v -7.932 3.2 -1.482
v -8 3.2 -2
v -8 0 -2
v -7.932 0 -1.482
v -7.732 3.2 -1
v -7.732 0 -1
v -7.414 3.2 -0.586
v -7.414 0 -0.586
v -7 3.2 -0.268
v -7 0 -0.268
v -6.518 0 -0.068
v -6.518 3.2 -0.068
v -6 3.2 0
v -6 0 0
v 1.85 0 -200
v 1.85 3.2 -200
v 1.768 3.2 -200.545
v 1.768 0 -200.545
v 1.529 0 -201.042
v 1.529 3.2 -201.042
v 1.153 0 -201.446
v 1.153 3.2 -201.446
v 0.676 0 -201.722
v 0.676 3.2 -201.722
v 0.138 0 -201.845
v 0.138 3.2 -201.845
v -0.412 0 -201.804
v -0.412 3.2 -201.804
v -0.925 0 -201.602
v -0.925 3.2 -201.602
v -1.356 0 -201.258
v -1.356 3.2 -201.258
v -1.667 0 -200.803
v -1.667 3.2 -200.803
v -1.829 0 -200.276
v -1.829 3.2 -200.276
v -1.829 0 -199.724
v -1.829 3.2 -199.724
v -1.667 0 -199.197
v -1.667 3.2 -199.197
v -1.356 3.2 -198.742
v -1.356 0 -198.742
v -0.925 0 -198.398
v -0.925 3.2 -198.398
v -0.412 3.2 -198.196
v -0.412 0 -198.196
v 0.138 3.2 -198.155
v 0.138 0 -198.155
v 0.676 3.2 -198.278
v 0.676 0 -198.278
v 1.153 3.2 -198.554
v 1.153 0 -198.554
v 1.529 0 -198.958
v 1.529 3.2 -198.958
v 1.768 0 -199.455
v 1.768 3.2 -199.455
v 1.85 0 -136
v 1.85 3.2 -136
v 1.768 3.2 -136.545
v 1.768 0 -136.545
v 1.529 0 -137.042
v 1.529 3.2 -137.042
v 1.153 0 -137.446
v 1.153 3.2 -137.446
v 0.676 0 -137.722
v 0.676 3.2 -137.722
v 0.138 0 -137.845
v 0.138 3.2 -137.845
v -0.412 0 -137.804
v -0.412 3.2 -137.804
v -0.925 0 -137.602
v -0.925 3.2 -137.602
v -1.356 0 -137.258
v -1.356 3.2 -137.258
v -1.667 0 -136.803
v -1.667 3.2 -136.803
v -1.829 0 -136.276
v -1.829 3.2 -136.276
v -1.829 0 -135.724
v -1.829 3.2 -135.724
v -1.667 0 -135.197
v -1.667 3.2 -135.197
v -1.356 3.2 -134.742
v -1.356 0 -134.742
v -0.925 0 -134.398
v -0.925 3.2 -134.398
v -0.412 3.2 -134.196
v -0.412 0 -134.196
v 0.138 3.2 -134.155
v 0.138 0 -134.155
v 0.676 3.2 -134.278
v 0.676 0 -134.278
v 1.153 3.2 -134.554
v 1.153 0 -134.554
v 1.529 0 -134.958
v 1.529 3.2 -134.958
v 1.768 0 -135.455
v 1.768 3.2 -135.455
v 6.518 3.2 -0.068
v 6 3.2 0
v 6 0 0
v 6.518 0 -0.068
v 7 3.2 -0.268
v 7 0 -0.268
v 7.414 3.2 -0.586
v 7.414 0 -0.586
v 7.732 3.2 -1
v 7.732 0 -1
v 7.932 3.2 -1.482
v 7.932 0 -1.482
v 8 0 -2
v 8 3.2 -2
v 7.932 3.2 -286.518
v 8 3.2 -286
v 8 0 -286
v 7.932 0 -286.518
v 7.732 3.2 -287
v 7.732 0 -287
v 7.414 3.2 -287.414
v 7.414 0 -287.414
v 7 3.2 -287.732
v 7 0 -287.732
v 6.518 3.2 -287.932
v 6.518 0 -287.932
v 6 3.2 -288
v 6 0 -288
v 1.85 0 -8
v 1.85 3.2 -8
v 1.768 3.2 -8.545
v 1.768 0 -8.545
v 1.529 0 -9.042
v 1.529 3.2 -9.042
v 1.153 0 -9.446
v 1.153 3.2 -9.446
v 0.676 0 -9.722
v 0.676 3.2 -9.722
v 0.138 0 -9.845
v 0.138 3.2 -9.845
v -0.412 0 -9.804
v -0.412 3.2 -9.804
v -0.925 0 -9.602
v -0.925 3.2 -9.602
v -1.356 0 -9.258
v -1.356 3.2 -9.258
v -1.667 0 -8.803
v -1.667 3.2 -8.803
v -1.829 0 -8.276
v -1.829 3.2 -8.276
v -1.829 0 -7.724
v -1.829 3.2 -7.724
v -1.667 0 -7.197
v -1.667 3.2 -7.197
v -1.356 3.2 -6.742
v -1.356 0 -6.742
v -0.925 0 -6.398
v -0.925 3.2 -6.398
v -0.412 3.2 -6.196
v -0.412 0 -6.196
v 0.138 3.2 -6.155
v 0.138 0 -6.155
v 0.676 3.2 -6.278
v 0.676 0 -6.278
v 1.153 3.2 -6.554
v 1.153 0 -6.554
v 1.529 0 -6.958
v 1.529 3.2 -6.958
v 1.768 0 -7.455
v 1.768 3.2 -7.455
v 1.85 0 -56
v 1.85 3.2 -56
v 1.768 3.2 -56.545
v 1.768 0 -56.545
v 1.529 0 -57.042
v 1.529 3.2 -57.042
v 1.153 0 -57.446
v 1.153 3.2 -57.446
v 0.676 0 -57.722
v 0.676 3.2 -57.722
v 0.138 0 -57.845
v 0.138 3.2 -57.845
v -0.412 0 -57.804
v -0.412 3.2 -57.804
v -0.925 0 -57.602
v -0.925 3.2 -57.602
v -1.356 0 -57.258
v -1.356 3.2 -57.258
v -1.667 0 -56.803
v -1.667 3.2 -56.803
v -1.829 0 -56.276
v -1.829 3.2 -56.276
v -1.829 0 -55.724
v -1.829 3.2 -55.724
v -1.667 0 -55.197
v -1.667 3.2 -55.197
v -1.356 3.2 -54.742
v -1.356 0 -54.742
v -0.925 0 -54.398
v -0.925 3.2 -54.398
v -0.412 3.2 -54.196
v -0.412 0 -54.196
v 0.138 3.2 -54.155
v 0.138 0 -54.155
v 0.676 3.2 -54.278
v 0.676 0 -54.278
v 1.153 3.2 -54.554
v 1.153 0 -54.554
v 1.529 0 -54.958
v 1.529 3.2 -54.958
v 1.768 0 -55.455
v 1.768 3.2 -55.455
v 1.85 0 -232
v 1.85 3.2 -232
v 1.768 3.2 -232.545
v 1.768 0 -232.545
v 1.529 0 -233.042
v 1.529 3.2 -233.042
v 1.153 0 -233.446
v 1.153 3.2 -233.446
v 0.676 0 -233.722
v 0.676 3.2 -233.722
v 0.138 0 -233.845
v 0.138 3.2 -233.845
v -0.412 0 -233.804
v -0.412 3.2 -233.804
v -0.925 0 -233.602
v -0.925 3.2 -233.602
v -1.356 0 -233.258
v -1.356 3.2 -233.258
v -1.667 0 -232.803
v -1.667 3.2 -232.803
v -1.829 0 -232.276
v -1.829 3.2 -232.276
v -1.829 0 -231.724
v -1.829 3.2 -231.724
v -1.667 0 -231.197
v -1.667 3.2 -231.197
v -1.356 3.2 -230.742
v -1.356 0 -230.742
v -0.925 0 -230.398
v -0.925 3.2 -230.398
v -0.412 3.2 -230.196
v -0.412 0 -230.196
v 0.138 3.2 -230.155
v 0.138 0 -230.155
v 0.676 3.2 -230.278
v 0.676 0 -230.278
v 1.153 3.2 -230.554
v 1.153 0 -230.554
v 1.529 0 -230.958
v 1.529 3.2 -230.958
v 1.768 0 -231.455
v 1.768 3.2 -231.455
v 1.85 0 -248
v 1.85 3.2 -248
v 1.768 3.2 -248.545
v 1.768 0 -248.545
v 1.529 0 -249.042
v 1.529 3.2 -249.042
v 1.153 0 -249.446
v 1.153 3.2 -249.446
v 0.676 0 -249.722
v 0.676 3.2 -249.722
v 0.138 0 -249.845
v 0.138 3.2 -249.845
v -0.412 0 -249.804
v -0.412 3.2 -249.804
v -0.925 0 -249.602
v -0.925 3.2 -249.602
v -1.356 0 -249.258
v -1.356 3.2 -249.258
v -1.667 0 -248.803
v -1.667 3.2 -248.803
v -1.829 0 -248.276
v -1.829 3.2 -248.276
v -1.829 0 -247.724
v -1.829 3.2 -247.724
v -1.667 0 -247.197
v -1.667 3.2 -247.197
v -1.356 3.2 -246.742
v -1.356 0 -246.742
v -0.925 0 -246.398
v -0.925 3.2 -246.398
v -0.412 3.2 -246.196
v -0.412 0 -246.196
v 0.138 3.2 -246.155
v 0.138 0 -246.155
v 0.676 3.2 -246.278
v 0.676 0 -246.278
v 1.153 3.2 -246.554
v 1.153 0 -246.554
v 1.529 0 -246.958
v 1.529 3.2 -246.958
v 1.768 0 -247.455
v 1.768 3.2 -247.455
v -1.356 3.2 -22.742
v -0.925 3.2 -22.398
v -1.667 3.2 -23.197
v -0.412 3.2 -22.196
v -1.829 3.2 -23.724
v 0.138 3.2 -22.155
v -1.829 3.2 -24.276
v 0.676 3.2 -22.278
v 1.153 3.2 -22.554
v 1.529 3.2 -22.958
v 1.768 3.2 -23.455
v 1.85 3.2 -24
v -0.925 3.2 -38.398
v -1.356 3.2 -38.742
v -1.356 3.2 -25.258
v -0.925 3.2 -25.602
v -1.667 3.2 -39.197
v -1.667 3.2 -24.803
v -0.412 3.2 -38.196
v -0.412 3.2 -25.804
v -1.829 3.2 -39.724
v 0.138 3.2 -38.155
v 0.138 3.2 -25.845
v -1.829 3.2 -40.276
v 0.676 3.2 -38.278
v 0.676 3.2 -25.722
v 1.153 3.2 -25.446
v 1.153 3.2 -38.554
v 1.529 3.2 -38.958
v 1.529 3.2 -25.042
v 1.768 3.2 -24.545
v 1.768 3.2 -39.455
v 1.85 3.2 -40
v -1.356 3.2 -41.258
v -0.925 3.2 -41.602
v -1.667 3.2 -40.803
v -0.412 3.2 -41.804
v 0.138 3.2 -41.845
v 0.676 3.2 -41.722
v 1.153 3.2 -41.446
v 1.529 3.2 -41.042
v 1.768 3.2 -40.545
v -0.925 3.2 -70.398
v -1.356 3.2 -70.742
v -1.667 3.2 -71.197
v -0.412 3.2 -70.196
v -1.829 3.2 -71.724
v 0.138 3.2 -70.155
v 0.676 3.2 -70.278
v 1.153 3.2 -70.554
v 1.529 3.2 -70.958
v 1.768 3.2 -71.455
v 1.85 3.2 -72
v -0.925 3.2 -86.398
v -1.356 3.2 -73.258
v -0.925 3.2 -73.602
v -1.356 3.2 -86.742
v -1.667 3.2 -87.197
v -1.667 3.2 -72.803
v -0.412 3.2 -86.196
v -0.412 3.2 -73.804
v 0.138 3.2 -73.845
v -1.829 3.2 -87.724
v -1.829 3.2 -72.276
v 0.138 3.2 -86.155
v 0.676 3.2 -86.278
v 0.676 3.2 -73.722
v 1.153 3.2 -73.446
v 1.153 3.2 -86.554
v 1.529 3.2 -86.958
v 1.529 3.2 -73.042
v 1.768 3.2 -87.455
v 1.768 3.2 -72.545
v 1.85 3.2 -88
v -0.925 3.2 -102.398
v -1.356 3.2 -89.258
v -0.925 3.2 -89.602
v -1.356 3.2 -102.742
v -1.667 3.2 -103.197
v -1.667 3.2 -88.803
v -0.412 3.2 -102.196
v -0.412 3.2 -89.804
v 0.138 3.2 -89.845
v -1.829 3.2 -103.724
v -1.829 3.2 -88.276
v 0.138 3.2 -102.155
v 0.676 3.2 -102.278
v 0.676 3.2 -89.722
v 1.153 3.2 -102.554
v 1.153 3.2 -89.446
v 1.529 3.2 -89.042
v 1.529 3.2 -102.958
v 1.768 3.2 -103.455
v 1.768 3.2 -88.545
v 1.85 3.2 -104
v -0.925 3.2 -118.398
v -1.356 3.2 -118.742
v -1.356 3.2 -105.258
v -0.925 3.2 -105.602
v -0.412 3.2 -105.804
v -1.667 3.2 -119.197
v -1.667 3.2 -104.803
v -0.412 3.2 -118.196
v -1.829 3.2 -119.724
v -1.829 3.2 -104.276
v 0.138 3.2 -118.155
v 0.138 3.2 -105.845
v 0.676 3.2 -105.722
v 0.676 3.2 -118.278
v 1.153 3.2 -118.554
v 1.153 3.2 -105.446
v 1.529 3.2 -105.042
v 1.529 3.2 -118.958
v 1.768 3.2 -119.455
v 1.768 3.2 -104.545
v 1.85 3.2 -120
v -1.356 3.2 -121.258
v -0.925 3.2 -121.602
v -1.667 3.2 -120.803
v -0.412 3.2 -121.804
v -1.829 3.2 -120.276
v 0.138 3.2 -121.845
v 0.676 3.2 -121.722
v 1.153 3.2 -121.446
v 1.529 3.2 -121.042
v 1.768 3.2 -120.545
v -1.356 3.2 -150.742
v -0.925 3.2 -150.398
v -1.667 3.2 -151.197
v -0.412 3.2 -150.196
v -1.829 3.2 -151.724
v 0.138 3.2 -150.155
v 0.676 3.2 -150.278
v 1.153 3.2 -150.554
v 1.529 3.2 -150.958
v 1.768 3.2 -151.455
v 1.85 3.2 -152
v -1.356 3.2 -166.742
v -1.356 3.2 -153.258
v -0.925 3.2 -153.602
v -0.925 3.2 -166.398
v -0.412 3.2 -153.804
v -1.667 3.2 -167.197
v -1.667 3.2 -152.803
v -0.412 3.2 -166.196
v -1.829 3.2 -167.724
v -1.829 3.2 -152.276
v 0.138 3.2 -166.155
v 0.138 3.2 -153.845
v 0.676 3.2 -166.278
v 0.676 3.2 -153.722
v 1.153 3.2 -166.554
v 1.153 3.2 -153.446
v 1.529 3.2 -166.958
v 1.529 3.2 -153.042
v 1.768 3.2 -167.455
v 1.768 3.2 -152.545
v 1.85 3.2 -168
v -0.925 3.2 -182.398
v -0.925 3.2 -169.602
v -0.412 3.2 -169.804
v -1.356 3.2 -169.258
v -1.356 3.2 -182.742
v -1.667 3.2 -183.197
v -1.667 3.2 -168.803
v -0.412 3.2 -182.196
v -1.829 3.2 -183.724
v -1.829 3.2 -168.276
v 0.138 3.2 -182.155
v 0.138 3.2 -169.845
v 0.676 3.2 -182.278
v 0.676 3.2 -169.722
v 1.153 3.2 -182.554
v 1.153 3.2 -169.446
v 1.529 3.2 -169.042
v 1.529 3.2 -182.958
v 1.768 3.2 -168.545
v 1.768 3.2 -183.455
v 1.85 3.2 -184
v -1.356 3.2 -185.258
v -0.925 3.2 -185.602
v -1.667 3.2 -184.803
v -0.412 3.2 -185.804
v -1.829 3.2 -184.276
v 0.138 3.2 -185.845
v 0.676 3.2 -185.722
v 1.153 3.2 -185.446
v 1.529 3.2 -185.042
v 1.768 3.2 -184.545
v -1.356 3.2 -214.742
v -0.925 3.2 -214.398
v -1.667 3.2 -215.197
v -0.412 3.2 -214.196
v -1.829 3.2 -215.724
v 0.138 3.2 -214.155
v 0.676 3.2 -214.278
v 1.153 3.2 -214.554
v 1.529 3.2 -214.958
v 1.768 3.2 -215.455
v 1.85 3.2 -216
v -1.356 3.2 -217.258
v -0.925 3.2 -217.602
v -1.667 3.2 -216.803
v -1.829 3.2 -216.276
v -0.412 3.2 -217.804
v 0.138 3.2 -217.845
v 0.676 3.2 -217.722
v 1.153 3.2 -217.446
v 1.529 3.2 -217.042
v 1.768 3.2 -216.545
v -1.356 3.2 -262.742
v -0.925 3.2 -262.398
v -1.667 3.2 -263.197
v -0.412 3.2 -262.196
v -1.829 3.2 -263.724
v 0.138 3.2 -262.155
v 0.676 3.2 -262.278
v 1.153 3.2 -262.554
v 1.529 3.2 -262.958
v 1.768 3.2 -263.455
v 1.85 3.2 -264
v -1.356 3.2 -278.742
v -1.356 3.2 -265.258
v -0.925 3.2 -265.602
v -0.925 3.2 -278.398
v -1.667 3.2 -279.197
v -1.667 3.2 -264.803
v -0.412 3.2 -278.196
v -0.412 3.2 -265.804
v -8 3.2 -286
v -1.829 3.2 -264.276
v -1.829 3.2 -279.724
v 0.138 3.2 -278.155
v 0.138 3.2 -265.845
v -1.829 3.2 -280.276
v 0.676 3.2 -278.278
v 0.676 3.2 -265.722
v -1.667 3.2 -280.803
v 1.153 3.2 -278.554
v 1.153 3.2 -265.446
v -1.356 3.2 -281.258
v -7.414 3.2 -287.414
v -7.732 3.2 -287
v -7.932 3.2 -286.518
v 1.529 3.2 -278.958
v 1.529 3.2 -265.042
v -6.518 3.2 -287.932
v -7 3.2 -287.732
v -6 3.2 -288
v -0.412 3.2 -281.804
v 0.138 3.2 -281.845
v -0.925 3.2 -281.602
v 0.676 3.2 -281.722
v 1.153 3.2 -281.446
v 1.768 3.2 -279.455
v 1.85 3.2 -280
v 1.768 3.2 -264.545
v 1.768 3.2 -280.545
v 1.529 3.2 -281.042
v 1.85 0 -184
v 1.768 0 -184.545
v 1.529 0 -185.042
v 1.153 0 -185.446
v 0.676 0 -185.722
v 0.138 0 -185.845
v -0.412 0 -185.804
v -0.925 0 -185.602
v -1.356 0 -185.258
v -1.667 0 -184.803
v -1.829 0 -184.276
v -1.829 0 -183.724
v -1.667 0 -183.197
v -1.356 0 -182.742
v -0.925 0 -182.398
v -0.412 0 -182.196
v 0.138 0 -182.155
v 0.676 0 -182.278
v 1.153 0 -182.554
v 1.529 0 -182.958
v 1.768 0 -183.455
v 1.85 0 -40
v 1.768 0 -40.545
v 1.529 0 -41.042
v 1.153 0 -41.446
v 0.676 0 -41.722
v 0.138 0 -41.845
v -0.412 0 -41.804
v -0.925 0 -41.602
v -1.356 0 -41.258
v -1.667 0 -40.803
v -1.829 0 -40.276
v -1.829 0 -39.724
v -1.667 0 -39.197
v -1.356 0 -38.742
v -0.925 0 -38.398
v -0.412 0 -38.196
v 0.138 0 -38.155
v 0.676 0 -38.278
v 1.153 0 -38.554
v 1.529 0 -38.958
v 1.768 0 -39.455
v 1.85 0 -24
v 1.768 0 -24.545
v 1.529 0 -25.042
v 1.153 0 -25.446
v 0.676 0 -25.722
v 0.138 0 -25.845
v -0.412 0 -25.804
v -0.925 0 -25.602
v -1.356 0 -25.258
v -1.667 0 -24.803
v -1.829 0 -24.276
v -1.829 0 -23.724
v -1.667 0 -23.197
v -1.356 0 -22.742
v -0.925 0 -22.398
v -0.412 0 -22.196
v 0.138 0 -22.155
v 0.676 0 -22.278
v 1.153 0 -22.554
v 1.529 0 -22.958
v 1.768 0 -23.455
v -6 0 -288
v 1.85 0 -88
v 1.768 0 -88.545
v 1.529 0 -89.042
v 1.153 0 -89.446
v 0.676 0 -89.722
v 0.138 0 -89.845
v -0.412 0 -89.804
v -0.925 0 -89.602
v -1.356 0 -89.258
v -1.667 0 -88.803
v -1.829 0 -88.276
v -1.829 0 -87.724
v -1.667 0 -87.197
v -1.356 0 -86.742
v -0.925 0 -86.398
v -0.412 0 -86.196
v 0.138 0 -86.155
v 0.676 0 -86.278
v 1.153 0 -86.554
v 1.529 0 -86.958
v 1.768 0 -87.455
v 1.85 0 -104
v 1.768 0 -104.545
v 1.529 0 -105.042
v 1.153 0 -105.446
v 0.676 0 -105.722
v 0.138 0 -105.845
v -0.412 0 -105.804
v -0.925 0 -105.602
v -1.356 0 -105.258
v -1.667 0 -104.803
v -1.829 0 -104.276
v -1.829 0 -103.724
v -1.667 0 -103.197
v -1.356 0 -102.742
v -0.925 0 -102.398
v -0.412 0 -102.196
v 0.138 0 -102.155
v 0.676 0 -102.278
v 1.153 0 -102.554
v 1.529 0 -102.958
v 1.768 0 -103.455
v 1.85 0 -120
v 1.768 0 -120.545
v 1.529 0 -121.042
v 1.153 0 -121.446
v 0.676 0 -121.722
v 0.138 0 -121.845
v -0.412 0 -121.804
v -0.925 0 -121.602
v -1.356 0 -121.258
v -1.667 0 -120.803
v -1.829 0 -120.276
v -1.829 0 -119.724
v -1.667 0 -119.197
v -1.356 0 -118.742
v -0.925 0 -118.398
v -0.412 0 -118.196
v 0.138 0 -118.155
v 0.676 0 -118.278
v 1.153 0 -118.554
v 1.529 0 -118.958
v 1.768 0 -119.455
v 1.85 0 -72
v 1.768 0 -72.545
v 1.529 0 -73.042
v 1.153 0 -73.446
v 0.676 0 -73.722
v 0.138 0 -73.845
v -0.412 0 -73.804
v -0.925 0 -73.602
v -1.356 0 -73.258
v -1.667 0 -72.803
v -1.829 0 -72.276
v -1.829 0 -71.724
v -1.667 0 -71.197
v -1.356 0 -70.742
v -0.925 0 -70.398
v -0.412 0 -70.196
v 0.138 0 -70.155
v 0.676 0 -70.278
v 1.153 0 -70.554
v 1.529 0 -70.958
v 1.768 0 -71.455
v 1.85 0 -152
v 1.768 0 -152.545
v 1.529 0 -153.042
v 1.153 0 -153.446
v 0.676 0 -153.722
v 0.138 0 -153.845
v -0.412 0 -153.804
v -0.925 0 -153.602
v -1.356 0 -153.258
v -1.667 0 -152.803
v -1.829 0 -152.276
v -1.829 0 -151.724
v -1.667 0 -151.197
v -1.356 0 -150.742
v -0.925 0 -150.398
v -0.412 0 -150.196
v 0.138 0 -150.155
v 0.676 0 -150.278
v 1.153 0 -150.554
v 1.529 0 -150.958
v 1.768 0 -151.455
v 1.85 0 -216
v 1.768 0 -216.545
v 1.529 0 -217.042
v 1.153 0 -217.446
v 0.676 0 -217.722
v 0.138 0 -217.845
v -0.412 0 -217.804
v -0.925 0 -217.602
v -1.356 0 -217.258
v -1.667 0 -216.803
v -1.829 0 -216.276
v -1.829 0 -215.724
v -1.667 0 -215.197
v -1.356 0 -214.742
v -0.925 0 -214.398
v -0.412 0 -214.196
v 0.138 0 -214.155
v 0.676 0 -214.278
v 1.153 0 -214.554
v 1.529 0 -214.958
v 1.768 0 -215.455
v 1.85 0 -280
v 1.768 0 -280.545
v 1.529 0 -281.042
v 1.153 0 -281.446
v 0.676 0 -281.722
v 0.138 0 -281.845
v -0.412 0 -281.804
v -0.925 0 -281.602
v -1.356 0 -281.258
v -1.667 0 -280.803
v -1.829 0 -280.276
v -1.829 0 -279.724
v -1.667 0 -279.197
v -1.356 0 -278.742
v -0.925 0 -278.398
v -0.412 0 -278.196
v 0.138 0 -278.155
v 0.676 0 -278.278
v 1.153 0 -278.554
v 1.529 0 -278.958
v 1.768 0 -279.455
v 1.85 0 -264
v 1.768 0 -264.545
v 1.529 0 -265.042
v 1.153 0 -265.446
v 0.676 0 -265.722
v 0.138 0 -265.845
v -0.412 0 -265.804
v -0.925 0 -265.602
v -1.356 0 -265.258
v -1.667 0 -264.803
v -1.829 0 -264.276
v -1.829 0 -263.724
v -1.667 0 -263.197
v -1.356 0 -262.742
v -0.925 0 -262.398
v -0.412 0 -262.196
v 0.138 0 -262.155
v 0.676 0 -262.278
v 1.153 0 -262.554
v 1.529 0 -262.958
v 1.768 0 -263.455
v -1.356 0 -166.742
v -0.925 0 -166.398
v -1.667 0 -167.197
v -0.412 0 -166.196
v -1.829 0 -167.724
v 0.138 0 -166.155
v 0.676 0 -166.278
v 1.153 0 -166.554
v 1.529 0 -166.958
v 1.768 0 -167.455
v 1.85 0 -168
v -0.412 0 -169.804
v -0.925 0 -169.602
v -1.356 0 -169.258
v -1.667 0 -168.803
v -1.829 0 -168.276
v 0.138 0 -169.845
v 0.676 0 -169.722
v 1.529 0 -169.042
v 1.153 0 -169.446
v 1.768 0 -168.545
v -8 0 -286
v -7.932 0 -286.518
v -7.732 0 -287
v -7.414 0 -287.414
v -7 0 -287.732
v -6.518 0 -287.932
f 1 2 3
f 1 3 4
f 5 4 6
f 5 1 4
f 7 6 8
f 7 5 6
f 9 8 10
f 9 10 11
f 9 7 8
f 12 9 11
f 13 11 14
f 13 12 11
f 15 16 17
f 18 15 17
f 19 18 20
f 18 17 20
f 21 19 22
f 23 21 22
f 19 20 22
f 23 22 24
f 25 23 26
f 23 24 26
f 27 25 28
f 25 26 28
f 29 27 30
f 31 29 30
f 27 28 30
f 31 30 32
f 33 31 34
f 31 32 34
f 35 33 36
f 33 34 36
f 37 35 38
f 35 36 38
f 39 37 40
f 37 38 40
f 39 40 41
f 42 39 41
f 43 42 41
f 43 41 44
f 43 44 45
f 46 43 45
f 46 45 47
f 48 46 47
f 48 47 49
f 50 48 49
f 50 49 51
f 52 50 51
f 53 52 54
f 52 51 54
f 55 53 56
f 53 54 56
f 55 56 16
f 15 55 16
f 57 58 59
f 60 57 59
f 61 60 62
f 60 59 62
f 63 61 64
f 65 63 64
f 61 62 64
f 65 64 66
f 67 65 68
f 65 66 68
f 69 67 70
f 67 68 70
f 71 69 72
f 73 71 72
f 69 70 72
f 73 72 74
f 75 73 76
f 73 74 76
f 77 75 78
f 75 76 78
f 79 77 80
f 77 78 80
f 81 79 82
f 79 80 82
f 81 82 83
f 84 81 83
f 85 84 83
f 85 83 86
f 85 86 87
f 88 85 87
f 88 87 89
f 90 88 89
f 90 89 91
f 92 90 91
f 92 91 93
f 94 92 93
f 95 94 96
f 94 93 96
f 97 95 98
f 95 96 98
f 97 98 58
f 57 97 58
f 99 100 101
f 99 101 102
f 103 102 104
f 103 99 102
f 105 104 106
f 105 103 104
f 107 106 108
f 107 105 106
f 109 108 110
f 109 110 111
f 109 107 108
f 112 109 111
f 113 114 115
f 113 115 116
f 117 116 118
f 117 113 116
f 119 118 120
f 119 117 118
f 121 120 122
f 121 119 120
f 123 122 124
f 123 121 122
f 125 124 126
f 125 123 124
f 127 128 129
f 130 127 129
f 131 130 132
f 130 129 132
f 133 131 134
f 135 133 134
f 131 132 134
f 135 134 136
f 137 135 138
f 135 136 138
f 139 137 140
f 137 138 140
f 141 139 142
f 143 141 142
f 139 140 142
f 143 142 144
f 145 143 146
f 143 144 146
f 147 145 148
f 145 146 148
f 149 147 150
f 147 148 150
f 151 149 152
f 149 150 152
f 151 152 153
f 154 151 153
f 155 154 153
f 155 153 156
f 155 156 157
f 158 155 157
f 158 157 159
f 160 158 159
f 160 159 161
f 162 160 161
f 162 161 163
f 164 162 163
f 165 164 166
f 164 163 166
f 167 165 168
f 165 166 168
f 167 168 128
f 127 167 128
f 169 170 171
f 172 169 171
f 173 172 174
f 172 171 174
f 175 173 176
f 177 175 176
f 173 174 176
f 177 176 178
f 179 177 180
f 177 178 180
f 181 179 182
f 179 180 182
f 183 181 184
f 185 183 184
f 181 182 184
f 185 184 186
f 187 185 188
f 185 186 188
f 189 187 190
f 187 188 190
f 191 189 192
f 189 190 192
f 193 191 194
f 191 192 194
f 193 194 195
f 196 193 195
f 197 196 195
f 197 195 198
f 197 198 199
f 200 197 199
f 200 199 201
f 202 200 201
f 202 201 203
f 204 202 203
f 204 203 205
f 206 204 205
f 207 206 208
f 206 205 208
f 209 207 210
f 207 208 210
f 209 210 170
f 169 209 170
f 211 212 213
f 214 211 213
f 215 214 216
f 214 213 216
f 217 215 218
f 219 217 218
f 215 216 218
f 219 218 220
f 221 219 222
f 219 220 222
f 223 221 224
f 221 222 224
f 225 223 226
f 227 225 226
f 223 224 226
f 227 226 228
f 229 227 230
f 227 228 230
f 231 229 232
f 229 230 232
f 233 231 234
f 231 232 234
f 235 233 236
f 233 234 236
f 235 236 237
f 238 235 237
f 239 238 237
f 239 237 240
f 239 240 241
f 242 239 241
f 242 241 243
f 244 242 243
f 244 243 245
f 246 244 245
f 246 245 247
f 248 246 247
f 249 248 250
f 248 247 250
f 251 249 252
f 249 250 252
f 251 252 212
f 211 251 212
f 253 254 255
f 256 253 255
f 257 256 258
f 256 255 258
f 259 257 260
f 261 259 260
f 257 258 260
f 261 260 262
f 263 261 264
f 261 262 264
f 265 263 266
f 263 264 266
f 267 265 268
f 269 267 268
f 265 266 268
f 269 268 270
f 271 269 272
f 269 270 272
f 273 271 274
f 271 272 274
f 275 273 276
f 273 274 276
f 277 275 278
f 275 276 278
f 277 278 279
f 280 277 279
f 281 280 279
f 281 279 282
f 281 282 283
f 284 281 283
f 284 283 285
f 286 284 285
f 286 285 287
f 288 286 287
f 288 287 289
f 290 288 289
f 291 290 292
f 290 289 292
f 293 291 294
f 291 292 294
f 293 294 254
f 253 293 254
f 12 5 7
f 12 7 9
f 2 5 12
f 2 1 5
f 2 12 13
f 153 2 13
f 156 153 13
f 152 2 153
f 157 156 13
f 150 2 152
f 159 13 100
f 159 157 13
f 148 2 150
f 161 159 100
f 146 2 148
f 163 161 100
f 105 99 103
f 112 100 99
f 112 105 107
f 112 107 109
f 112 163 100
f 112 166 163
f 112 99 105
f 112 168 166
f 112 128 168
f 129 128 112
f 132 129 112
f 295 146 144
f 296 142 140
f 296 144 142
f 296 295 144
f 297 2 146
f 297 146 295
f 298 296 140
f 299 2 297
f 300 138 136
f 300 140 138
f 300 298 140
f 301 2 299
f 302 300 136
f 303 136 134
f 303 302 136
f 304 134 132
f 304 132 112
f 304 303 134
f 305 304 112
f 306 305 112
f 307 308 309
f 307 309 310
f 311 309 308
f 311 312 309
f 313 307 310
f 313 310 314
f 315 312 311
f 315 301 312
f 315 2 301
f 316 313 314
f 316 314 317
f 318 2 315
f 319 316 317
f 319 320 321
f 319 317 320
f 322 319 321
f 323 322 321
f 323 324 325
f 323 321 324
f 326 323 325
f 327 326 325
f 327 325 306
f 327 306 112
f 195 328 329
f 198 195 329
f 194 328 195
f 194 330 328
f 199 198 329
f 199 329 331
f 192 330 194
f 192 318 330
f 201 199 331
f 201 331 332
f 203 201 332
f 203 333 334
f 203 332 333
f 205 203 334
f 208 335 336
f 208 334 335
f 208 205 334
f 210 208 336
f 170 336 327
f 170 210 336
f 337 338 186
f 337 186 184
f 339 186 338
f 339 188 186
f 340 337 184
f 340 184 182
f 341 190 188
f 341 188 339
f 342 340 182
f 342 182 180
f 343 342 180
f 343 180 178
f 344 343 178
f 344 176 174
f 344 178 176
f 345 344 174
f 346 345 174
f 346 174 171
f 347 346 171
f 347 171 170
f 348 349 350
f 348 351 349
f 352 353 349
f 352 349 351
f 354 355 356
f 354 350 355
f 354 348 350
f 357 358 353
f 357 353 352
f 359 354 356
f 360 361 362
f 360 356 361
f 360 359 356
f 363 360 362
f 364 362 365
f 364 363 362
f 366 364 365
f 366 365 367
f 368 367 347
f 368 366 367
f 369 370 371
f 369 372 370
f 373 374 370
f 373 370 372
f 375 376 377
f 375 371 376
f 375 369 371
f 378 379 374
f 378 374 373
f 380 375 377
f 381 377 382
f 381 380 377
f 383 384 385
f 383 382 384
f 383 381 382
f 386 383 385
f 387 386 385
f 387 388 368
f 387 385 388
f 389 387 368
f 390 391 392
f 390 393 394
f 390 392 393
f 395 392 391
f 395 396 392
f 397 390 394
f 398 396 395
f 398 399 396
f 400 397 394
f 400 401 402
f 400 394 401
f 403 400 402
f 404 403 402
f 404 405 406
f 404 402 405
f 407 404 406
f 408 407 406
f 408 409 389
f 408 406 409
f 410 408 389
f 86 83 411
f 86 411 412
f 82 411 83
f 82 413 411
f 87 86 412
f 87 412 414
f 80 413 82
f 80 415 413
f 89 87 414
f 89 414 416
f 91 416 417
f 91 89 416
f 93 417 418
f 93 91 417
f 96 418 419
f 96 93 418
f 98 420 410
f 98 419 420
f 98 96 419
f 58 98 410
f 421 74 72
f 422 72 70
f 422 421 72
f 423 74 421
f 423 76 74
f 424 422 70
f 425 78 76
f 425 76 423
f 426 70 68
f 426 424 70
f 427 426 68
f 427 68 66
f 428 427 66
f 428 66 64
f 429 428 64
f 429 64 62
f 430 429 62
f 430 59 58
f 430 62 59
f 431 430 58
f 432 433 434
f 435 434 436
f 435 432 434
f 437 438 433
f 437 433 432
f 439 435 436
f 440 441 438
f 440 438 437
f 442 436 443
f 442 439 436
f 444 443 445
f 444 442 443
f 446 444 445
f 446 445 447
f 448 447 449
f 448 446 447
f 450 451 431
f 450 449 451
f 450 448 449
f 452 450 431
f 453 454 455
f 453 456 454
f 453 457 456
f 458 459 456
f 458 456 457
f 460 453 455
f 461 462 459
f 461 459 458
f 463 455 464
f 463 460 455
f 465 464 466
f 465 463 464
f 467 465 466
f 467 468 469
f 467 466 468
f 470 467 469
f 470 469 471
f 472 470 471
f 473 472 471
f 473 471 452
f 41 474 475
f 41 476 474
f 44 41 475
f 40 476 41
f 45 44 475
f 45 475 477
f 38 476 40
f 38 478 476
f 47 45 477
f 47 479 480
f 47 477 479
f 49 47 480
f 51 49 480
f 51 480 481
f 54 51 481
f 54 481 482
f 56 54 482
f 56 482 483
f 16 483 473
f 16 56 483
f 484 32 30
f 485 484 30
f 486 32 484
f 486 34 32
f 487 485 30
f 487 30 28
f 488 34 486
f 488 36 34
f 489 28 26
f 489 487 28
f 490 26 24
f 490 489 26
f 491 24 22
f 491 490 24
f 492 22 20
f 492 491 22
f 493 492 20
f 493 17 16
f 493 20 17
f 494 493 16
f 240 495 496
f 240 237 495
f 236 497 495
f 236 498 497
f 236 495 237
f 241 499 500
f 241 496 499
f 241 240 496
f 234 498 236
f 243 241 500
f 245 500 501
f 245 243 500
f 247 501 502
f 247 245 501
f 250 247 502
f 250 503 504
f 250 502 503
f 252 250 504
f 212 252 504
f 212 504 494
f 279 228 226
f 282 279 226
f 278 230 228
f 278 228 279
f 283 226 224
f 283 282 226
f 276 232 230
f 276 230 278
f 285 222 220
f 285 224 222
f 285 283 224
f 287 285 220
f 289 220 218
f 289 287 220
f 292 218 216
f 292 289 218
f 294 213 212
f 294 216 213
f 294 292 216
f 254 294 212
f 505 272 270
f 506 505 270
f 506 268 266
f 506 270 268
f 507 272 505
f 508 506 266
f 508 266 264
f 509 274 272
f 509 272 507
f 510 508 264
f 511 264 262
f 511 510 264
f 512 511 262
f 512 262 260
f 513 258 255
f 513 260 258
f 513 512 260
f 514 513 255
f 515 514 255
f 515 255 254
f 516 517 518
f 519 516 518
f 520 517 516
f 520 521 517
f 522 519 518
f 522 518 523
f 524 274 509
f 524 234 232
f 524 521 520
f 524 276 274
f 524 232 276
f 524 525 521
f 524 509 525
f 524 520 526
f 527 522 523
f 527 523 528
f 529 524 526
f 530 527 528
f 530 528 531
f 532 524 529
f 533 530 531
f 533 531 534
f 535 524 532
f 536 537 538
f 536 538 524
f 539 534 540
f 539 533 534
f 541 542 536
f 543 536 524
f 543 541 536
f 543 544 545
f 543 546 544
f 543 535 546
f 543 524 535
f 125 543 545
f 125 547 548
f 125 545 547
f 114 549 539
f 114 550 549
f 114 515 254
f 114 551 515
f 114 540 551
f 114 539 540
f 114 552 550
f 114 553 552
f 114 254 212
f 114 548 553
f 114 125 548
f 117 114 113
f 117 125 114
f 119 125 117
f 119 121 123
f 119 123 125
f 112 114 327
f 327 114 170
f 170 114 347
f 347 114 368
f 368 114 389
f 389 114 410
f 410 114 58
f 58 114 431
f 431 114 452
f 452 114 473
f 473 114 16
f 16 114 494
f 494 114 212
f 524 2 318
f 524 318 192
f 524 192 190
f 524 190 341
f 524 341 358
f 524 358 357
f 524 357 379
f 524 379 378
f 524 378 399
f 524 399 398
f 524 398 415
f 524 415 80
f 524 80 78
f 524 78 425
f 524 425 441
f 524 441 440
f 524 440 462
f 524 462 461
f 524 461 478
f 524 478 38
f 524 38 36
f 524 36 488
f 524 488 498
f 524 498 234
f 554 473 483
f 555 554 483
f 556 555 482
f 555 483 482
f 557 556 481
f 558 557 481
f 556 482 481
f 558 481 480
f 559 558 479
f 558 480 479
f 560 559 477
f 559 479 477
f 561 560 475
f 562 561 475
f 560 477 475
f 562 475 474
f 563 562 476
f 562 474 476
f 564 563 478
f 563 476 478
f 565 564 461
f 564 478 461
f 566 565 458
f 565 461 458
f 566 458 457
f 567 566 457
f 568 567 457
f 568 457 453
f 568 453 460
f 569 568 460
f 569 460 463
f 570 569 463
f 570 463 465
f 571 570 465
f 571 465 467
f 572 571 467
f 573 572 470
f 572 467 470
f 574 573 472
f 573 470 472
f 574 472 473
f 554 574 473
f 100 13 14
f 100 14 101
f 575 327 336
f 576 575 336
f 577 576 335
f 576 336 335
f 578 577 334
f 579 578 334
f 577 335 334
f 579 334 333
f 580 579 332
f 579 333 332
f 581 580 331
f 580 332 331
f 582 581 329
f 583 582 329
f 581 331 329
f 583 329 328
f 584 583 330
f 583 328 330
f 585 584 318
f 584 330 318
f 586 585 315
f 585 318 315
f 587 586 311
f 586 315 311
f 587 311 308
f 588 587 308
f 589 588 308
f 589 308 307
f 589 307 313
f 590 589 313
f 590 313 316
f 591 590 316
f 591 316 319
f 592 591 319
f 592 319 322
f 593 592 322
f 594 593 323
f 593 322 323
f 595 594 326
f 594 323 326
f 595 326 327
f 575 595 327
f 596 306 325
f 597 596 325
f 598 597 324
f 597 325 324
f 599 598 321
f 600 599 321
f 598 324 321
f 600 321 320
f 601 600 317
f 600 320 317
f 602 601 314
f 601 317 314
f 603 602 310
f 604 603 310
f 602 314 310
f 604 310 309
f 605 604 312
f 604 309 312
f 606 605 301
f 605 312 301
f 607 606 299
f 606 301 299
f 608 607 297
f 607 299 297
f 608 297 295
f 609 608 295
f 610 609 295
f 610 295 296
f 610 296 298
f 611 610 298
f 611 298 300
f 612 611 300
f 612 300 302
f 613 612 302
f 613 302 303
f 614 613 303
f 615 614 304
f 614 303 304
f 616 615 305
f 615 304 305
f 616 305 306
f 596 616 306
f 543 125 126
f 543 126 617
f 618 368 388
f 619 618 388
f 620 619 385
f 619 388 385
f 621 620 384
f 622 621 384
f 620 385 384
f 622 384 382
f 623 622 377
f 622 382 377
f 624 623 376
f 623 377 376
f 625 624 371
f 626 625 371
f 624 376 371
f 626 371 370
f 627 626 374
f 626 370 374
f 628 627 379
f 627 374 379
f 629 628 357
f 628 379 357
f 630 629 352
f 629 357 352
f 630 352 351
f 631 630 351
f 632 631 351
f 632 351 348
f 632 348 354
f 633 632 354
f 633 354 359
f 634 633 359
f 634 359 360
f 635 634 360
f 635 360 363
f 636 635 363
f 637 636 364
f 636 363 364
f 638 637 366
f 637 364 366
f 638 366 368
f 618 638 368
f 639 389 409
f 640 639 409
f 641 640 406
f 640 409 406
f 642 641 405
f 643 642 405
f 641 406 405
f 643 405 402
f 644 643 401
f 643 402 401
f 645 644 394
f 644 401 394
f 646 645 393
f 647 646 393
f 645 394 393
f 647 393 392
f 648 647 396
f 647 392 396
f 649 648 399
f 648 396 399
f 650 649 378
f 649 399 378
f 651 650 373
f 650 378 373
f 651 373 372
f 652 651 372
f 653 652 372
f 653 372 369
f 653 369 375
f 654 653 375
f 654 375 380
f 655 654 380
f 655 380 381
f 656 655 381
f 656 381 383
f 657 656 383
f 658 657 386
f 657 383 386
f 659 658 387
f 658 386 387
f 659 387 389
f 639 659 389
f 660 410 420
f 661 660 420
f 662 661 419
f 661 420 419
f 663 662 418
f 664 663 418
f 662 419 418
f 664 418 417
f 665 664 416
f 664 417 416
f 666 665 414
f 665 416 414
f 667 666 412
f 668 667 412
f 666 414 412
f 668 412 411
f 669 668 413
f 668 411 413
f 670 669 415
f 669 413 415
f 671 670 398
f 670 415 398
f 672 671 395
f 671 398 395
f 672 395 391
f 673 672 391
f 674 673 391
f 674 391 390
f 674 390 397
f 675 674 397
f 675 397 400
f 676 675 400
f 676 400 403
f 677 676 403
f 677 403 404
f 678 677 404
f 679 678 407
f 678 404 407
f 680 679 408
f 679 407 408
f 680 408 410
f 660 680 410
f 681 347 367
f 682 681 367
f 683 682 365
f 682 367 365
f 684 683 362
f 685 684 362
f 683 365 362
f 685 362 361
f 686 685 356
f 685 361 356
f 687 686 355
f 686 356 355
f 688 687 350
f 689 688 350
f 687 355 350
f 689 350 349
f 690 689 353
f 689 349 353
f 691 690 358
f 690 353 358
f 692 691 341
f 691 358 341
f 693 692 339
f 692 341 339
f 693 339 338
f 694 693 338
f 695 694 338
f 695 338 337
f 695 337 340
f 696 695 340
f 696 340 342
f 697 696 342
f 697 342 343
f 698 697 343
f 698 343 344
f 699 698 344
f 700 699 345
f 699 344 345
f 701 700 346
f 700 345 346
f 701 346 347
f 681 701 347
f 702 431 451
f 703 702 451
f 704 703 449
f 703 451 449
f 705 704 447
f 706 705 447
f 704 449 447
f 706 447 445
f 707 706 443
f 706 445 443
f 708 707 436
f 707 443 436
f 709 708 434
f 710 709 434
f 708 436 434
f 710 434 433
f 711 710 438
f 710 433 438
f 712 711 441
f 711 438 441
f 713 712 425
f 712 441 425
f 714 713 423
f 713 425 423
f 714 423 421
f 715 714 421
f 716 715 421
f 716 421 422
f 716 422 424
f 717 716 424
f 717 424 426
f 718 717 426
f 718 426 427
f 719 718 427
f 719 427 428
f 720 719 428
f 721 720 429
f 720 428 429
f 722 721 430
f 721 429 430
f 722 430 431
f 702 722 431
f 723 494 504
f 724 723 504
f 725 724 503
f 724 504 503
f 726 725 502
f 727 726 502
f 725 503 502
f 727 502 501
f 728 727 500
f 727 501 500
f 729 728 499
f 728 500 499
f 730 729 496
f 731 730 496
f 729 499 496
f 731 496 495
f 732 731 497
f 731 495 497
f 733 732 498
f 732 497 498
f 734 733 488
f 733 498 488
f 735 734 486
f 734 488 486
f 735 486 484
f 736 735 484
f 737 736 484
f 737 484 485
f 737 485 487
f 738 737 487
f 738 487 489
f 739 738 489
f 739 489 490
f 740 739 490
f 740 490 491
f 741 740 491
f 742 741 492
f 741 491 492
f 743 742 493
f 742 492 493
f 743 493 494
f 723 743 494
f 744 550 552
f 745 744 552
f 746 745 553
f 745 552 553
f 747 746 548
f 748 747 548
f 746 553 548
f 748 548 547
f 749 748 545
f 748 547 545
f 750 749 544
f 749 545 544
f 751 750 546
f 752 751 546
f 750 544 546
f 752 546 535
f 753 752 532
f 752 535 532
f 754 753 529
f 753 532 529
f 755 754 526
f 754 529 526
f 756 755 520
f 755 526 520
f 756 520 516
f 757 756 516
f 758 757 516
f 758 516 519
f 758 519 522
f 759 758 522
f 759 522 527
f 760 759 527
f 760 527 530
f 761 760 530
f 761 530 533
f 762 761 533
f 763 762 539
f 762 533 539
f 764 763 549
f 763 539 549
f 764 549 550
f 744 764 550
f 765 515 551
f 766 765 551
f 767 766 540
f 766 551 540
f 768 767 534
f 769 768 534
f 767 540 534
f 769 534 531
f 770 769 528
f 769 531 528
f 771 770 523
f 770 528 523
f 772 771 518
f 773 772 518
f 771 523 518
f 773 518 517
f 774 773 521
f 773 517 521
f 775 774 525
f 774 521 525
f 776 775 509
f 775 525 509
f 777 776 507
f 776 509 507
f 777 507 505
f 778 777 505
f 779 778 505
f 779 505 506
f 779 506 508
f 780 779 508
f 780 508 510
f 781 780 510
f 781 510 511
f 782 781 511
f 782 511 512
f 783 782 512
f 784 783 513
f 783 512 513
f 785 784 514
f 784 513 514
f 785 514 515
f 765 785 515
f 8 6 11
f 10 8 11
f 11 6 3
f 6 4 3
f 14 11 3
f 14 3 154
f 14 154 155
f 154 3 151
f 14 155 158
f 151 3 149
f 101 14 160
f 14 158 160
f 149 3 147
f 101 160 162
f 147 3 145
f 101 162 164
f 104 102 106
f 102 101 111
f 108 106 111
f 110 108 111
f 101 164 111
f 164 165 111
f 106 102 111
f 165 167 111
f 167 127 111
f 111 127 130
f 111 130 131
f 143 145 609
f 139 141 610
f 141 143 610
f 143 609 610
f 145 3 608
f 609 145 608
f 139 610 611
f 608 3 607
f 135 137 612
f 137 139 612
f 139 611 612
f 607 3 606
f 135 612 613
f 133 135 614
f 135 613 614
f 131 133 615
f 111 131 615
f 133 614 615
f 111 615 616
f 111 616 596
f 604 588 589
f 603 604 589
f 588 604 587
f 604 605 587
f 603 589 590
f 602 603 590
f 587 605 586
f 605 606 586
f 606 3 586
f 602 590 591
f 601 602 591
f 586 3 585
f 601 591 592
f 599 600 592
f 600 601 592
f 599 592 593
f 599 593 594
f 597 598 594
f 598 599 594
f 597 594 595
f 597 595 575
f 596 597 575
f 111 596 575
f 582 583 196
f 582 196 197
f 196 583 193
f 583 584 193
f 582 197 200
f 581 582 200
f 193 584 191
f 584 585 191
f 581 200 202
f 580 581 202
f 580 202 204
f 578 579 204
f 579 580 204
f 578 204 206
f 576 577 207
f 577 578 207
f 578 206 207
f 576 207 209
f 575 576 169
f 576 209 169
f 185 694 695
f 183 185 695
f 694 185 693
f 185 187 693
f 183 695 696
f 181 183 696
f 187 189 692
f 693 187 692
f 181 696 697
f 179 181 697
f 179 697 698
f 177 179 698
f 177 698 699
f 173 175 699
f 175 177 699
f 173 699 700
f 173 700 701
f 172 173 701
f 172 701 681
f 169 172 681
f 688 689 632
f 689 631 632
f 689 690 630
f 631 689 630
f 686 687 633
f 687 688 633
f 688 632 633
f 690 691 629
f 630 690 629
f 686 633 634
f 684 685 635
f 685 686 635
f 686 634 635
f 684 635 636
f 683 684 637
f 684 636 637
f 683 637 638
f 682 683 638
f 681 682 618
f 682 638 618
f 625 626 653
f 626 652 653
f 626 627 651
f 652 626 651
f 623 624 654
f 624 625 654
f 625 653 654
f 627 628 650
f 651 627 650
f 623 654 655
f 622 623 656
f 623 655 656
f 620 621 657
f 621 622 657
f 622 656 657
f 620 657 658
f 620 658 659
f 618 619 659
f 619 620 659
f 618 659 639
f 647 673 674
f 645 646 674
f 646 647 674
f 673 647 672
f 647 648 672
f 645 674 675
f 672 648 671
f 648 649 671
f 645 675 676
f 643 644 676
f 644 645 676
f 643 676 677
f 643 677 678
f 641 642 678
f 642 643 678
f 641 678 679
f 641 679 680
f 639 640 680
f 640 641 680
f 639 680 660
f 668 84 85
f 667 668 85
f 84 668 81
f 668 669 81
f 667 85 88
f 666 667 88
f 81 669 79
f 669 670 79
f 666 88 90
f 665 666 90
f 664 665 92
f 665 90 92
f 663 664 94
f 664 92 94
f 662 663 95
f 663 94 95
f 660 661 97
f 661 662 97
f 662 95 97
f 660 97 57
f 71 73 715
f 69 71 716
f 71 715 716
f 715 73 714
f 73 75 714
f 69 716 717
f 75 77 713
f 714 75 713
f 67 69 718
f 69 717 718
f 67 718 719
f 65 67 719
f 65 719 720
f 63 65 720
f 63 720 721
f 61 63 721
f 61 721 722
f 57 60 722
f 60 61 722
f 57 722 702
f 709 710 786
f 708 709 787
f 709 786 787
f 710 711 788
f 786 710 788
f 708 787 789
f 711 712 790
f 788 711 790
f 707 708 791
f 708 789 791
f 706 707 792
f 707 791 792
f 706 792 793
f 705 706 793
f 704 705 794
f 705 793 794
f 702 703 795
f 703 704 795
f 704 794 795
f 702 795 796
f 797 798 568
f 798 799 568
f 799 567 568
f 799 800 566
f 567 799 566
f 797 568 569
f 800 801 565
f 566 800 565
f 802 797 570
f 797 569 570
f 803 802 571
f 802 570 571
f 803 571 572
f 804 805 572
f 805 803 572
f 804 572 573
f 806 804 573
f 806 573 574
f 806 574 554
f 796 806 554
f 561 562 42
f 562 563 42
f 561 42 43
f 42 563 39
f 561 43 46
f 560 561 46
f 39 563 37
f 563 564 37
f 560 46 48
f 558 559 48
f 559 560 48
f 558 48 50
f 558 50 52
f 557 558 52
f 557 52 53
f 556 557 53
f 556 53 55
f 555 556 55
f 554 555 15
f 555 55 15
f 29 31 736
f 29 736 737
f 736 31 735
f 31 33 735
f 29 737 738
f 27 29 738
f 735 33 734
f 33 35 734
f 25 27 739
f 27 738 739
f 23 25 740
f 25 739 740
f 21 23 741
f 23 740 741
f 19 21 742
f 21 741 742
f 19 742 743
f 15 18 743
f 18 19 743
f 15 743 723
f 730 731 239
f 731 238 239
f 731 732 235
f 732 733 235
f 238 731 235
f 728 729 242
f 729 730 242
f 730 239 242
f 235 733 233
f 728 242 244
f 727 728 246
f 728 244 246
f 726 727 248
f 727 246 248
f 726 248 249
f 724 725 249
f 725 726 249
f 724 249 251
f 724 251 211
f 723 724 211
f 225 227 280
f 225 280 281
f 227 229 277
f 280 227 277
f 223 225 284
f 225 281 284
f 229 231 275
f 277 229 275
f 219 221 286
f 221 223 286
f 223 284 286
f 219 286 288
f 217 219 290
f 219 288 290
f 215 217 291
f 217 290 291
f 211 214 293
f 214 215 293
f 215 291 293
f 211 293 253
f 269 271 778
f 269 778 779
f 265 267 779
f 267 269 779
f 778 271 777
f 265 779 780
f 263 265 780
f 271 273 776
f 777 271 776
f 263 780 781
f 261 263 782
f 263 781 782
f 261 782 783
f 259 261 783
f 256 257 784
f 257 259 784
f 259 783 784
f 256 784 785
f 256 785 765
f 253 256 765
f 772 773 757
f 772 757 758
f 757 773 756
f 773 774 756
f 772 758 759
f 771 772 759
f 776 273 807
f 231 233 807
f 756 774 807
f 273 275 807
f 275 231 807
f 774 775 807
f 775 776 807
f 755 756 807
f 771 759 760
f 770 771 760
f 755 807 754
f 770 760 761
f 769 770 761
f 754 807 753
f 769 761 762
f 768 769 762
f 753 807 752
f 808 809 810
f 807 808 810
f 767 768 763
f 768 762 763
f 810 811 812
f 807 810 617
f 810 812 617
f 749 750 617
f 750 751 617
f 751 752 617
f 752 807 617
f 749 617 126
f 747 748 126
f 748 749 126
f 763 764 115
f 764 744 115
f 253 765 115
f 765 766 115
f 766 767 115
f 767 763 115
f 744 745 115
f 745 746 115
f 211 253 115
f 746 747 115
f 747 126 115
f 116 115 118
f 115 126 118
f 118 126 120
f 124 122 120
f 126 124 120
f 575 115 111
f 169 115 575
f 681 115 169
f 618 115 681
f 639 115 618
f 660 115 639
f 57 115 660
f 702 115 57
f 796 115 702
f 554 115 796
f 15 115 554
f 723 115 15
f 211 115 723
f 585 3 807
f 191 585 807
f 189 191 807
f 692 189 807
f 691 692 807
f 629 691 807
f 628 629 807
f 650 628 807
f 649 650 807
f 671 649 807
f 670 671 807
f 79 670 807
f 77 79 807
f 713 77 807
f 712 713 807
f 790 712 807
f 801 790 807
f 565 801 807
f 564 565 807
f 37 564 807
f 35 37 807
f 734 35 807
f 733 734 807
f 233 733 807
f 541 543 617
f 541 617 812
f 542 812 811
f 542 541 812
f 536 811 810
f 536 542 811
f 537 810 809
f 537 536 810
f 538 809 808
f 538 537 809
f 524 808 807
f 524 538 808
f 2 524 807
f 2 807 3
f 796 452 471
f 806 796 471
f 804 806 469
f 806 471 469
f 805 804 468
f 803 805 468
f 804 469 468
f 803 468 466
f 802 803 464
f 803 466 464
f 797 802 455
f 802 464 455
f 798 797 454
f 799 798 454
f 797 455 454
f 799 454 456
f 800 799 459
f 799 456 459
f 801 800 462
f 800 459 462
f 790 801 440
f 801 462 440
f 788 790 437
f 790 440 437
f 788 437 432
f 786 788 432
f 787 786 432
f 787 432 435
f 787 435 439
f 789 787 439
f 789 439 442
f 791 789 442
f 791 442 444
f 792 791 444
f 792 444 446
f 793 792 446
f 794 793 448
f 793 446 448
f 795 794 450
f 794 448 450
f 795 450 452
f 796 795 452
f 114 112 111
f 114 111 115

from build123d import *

# Parameters (mm, degrees)
SKETCH1_R           = 1.85
BOSS_EXTRUDE1_DEPTH = 3.2


with BuildPart() as part:
    # Sketch1 → Boss-Extrude1 (new body)
    with BuildSketch(Plane(origin=(0, 3.2, 0), x_dir=(1, 0, 0), z_dir=(0, 1, 0))):
        with BuildLine():
            Line((8, 2), (8, 286))
            ThreePointArc((8, 286), (7.414213562, 287.414213562), (6, 288))
            Line((6, 288), (-6, 288))
            ThreePointArc((-6, 288), (-7.414213562, 287.414213562), (-8, 286))
            Line((-8, 286), (-8, 2))
            ThreePointArc((-8, 2), (-7.414213562, 0.585786438), (-6, 0))
            Line((-6, 0), (6, 0))
            ThreePointArc((6, 0), (7.414213562, 0.585786438), (8, 2))
        make_face()
        with Locations((0, 280)):
            Circle(SKETCH1_R, mode=Mode.SUBTRACT)
        with Locations((0, 264)):
            Circle(SKETCH1_R, mode=Mode.SUBTRACT)
        with Locations((0, 248)):
            Circle(SKETCH1_R, mode=Mode.SUBTRACT)
        with Locations((0, 232)):
            Circle(SKETCH1_R, mode=Mode.SUBTRACT)
        with Locations((0, 216)):
            Circle(SKETCH1_R, mode=Mode.SUBTRACT)
        with Locations((0, 200)):
            Circle(SKETCH1_R, mode=Mode.SUBTRACT)
        with Locations((0, 184)):
            Circle(SKETCH1_R, mode=Mode.SUBTRACT)
        with Locations((0, 168)):
            Circle(SKETCH1_R, mode=Mode.SUBTRACT)
        with Locations((0, 152)):
            Circle(SKETCH1_R, mode=Mode.SUBTRACT)
        with Locations((0, 136)):
            Circle(SKETCH1_R, mode=Mode.SUBTRACT)
        with Locations((0, 120)):
            Circle(SKETCH1_R, mode=Mode.SUBTRACT)
        with Locations((0, 104)):
            Circle(SKETCH1_R, mode=Mode.SUBTRACT)
        with Locations((0, 88)):
            Circle(SKETCH1_R, mode=Mode.SUBTRACT)
        with Locations((0, 72)):
            Circle(SKETCH1_R, mode=Mode.SUBTRACT)
        with Locations((0, 56)):
            Circle(SKETCH1_R, mode=Mode.SUBTRACT)
        with Locations((0, 40)):
            Circle(SKETCH1_R, mode=Mode.SUBTRACT)
        with Locations((0, 24)):
            Circle(SKETCH1_R, mode=Mode.SUBTRACT)
        with Locations((0, 8)):
            Circle(SKETCH1_R, mode=Mode.SUBTRACT)
    extrude(amount=-BOSS_EXTRUDE1_DEPTH)


solid = part.part
